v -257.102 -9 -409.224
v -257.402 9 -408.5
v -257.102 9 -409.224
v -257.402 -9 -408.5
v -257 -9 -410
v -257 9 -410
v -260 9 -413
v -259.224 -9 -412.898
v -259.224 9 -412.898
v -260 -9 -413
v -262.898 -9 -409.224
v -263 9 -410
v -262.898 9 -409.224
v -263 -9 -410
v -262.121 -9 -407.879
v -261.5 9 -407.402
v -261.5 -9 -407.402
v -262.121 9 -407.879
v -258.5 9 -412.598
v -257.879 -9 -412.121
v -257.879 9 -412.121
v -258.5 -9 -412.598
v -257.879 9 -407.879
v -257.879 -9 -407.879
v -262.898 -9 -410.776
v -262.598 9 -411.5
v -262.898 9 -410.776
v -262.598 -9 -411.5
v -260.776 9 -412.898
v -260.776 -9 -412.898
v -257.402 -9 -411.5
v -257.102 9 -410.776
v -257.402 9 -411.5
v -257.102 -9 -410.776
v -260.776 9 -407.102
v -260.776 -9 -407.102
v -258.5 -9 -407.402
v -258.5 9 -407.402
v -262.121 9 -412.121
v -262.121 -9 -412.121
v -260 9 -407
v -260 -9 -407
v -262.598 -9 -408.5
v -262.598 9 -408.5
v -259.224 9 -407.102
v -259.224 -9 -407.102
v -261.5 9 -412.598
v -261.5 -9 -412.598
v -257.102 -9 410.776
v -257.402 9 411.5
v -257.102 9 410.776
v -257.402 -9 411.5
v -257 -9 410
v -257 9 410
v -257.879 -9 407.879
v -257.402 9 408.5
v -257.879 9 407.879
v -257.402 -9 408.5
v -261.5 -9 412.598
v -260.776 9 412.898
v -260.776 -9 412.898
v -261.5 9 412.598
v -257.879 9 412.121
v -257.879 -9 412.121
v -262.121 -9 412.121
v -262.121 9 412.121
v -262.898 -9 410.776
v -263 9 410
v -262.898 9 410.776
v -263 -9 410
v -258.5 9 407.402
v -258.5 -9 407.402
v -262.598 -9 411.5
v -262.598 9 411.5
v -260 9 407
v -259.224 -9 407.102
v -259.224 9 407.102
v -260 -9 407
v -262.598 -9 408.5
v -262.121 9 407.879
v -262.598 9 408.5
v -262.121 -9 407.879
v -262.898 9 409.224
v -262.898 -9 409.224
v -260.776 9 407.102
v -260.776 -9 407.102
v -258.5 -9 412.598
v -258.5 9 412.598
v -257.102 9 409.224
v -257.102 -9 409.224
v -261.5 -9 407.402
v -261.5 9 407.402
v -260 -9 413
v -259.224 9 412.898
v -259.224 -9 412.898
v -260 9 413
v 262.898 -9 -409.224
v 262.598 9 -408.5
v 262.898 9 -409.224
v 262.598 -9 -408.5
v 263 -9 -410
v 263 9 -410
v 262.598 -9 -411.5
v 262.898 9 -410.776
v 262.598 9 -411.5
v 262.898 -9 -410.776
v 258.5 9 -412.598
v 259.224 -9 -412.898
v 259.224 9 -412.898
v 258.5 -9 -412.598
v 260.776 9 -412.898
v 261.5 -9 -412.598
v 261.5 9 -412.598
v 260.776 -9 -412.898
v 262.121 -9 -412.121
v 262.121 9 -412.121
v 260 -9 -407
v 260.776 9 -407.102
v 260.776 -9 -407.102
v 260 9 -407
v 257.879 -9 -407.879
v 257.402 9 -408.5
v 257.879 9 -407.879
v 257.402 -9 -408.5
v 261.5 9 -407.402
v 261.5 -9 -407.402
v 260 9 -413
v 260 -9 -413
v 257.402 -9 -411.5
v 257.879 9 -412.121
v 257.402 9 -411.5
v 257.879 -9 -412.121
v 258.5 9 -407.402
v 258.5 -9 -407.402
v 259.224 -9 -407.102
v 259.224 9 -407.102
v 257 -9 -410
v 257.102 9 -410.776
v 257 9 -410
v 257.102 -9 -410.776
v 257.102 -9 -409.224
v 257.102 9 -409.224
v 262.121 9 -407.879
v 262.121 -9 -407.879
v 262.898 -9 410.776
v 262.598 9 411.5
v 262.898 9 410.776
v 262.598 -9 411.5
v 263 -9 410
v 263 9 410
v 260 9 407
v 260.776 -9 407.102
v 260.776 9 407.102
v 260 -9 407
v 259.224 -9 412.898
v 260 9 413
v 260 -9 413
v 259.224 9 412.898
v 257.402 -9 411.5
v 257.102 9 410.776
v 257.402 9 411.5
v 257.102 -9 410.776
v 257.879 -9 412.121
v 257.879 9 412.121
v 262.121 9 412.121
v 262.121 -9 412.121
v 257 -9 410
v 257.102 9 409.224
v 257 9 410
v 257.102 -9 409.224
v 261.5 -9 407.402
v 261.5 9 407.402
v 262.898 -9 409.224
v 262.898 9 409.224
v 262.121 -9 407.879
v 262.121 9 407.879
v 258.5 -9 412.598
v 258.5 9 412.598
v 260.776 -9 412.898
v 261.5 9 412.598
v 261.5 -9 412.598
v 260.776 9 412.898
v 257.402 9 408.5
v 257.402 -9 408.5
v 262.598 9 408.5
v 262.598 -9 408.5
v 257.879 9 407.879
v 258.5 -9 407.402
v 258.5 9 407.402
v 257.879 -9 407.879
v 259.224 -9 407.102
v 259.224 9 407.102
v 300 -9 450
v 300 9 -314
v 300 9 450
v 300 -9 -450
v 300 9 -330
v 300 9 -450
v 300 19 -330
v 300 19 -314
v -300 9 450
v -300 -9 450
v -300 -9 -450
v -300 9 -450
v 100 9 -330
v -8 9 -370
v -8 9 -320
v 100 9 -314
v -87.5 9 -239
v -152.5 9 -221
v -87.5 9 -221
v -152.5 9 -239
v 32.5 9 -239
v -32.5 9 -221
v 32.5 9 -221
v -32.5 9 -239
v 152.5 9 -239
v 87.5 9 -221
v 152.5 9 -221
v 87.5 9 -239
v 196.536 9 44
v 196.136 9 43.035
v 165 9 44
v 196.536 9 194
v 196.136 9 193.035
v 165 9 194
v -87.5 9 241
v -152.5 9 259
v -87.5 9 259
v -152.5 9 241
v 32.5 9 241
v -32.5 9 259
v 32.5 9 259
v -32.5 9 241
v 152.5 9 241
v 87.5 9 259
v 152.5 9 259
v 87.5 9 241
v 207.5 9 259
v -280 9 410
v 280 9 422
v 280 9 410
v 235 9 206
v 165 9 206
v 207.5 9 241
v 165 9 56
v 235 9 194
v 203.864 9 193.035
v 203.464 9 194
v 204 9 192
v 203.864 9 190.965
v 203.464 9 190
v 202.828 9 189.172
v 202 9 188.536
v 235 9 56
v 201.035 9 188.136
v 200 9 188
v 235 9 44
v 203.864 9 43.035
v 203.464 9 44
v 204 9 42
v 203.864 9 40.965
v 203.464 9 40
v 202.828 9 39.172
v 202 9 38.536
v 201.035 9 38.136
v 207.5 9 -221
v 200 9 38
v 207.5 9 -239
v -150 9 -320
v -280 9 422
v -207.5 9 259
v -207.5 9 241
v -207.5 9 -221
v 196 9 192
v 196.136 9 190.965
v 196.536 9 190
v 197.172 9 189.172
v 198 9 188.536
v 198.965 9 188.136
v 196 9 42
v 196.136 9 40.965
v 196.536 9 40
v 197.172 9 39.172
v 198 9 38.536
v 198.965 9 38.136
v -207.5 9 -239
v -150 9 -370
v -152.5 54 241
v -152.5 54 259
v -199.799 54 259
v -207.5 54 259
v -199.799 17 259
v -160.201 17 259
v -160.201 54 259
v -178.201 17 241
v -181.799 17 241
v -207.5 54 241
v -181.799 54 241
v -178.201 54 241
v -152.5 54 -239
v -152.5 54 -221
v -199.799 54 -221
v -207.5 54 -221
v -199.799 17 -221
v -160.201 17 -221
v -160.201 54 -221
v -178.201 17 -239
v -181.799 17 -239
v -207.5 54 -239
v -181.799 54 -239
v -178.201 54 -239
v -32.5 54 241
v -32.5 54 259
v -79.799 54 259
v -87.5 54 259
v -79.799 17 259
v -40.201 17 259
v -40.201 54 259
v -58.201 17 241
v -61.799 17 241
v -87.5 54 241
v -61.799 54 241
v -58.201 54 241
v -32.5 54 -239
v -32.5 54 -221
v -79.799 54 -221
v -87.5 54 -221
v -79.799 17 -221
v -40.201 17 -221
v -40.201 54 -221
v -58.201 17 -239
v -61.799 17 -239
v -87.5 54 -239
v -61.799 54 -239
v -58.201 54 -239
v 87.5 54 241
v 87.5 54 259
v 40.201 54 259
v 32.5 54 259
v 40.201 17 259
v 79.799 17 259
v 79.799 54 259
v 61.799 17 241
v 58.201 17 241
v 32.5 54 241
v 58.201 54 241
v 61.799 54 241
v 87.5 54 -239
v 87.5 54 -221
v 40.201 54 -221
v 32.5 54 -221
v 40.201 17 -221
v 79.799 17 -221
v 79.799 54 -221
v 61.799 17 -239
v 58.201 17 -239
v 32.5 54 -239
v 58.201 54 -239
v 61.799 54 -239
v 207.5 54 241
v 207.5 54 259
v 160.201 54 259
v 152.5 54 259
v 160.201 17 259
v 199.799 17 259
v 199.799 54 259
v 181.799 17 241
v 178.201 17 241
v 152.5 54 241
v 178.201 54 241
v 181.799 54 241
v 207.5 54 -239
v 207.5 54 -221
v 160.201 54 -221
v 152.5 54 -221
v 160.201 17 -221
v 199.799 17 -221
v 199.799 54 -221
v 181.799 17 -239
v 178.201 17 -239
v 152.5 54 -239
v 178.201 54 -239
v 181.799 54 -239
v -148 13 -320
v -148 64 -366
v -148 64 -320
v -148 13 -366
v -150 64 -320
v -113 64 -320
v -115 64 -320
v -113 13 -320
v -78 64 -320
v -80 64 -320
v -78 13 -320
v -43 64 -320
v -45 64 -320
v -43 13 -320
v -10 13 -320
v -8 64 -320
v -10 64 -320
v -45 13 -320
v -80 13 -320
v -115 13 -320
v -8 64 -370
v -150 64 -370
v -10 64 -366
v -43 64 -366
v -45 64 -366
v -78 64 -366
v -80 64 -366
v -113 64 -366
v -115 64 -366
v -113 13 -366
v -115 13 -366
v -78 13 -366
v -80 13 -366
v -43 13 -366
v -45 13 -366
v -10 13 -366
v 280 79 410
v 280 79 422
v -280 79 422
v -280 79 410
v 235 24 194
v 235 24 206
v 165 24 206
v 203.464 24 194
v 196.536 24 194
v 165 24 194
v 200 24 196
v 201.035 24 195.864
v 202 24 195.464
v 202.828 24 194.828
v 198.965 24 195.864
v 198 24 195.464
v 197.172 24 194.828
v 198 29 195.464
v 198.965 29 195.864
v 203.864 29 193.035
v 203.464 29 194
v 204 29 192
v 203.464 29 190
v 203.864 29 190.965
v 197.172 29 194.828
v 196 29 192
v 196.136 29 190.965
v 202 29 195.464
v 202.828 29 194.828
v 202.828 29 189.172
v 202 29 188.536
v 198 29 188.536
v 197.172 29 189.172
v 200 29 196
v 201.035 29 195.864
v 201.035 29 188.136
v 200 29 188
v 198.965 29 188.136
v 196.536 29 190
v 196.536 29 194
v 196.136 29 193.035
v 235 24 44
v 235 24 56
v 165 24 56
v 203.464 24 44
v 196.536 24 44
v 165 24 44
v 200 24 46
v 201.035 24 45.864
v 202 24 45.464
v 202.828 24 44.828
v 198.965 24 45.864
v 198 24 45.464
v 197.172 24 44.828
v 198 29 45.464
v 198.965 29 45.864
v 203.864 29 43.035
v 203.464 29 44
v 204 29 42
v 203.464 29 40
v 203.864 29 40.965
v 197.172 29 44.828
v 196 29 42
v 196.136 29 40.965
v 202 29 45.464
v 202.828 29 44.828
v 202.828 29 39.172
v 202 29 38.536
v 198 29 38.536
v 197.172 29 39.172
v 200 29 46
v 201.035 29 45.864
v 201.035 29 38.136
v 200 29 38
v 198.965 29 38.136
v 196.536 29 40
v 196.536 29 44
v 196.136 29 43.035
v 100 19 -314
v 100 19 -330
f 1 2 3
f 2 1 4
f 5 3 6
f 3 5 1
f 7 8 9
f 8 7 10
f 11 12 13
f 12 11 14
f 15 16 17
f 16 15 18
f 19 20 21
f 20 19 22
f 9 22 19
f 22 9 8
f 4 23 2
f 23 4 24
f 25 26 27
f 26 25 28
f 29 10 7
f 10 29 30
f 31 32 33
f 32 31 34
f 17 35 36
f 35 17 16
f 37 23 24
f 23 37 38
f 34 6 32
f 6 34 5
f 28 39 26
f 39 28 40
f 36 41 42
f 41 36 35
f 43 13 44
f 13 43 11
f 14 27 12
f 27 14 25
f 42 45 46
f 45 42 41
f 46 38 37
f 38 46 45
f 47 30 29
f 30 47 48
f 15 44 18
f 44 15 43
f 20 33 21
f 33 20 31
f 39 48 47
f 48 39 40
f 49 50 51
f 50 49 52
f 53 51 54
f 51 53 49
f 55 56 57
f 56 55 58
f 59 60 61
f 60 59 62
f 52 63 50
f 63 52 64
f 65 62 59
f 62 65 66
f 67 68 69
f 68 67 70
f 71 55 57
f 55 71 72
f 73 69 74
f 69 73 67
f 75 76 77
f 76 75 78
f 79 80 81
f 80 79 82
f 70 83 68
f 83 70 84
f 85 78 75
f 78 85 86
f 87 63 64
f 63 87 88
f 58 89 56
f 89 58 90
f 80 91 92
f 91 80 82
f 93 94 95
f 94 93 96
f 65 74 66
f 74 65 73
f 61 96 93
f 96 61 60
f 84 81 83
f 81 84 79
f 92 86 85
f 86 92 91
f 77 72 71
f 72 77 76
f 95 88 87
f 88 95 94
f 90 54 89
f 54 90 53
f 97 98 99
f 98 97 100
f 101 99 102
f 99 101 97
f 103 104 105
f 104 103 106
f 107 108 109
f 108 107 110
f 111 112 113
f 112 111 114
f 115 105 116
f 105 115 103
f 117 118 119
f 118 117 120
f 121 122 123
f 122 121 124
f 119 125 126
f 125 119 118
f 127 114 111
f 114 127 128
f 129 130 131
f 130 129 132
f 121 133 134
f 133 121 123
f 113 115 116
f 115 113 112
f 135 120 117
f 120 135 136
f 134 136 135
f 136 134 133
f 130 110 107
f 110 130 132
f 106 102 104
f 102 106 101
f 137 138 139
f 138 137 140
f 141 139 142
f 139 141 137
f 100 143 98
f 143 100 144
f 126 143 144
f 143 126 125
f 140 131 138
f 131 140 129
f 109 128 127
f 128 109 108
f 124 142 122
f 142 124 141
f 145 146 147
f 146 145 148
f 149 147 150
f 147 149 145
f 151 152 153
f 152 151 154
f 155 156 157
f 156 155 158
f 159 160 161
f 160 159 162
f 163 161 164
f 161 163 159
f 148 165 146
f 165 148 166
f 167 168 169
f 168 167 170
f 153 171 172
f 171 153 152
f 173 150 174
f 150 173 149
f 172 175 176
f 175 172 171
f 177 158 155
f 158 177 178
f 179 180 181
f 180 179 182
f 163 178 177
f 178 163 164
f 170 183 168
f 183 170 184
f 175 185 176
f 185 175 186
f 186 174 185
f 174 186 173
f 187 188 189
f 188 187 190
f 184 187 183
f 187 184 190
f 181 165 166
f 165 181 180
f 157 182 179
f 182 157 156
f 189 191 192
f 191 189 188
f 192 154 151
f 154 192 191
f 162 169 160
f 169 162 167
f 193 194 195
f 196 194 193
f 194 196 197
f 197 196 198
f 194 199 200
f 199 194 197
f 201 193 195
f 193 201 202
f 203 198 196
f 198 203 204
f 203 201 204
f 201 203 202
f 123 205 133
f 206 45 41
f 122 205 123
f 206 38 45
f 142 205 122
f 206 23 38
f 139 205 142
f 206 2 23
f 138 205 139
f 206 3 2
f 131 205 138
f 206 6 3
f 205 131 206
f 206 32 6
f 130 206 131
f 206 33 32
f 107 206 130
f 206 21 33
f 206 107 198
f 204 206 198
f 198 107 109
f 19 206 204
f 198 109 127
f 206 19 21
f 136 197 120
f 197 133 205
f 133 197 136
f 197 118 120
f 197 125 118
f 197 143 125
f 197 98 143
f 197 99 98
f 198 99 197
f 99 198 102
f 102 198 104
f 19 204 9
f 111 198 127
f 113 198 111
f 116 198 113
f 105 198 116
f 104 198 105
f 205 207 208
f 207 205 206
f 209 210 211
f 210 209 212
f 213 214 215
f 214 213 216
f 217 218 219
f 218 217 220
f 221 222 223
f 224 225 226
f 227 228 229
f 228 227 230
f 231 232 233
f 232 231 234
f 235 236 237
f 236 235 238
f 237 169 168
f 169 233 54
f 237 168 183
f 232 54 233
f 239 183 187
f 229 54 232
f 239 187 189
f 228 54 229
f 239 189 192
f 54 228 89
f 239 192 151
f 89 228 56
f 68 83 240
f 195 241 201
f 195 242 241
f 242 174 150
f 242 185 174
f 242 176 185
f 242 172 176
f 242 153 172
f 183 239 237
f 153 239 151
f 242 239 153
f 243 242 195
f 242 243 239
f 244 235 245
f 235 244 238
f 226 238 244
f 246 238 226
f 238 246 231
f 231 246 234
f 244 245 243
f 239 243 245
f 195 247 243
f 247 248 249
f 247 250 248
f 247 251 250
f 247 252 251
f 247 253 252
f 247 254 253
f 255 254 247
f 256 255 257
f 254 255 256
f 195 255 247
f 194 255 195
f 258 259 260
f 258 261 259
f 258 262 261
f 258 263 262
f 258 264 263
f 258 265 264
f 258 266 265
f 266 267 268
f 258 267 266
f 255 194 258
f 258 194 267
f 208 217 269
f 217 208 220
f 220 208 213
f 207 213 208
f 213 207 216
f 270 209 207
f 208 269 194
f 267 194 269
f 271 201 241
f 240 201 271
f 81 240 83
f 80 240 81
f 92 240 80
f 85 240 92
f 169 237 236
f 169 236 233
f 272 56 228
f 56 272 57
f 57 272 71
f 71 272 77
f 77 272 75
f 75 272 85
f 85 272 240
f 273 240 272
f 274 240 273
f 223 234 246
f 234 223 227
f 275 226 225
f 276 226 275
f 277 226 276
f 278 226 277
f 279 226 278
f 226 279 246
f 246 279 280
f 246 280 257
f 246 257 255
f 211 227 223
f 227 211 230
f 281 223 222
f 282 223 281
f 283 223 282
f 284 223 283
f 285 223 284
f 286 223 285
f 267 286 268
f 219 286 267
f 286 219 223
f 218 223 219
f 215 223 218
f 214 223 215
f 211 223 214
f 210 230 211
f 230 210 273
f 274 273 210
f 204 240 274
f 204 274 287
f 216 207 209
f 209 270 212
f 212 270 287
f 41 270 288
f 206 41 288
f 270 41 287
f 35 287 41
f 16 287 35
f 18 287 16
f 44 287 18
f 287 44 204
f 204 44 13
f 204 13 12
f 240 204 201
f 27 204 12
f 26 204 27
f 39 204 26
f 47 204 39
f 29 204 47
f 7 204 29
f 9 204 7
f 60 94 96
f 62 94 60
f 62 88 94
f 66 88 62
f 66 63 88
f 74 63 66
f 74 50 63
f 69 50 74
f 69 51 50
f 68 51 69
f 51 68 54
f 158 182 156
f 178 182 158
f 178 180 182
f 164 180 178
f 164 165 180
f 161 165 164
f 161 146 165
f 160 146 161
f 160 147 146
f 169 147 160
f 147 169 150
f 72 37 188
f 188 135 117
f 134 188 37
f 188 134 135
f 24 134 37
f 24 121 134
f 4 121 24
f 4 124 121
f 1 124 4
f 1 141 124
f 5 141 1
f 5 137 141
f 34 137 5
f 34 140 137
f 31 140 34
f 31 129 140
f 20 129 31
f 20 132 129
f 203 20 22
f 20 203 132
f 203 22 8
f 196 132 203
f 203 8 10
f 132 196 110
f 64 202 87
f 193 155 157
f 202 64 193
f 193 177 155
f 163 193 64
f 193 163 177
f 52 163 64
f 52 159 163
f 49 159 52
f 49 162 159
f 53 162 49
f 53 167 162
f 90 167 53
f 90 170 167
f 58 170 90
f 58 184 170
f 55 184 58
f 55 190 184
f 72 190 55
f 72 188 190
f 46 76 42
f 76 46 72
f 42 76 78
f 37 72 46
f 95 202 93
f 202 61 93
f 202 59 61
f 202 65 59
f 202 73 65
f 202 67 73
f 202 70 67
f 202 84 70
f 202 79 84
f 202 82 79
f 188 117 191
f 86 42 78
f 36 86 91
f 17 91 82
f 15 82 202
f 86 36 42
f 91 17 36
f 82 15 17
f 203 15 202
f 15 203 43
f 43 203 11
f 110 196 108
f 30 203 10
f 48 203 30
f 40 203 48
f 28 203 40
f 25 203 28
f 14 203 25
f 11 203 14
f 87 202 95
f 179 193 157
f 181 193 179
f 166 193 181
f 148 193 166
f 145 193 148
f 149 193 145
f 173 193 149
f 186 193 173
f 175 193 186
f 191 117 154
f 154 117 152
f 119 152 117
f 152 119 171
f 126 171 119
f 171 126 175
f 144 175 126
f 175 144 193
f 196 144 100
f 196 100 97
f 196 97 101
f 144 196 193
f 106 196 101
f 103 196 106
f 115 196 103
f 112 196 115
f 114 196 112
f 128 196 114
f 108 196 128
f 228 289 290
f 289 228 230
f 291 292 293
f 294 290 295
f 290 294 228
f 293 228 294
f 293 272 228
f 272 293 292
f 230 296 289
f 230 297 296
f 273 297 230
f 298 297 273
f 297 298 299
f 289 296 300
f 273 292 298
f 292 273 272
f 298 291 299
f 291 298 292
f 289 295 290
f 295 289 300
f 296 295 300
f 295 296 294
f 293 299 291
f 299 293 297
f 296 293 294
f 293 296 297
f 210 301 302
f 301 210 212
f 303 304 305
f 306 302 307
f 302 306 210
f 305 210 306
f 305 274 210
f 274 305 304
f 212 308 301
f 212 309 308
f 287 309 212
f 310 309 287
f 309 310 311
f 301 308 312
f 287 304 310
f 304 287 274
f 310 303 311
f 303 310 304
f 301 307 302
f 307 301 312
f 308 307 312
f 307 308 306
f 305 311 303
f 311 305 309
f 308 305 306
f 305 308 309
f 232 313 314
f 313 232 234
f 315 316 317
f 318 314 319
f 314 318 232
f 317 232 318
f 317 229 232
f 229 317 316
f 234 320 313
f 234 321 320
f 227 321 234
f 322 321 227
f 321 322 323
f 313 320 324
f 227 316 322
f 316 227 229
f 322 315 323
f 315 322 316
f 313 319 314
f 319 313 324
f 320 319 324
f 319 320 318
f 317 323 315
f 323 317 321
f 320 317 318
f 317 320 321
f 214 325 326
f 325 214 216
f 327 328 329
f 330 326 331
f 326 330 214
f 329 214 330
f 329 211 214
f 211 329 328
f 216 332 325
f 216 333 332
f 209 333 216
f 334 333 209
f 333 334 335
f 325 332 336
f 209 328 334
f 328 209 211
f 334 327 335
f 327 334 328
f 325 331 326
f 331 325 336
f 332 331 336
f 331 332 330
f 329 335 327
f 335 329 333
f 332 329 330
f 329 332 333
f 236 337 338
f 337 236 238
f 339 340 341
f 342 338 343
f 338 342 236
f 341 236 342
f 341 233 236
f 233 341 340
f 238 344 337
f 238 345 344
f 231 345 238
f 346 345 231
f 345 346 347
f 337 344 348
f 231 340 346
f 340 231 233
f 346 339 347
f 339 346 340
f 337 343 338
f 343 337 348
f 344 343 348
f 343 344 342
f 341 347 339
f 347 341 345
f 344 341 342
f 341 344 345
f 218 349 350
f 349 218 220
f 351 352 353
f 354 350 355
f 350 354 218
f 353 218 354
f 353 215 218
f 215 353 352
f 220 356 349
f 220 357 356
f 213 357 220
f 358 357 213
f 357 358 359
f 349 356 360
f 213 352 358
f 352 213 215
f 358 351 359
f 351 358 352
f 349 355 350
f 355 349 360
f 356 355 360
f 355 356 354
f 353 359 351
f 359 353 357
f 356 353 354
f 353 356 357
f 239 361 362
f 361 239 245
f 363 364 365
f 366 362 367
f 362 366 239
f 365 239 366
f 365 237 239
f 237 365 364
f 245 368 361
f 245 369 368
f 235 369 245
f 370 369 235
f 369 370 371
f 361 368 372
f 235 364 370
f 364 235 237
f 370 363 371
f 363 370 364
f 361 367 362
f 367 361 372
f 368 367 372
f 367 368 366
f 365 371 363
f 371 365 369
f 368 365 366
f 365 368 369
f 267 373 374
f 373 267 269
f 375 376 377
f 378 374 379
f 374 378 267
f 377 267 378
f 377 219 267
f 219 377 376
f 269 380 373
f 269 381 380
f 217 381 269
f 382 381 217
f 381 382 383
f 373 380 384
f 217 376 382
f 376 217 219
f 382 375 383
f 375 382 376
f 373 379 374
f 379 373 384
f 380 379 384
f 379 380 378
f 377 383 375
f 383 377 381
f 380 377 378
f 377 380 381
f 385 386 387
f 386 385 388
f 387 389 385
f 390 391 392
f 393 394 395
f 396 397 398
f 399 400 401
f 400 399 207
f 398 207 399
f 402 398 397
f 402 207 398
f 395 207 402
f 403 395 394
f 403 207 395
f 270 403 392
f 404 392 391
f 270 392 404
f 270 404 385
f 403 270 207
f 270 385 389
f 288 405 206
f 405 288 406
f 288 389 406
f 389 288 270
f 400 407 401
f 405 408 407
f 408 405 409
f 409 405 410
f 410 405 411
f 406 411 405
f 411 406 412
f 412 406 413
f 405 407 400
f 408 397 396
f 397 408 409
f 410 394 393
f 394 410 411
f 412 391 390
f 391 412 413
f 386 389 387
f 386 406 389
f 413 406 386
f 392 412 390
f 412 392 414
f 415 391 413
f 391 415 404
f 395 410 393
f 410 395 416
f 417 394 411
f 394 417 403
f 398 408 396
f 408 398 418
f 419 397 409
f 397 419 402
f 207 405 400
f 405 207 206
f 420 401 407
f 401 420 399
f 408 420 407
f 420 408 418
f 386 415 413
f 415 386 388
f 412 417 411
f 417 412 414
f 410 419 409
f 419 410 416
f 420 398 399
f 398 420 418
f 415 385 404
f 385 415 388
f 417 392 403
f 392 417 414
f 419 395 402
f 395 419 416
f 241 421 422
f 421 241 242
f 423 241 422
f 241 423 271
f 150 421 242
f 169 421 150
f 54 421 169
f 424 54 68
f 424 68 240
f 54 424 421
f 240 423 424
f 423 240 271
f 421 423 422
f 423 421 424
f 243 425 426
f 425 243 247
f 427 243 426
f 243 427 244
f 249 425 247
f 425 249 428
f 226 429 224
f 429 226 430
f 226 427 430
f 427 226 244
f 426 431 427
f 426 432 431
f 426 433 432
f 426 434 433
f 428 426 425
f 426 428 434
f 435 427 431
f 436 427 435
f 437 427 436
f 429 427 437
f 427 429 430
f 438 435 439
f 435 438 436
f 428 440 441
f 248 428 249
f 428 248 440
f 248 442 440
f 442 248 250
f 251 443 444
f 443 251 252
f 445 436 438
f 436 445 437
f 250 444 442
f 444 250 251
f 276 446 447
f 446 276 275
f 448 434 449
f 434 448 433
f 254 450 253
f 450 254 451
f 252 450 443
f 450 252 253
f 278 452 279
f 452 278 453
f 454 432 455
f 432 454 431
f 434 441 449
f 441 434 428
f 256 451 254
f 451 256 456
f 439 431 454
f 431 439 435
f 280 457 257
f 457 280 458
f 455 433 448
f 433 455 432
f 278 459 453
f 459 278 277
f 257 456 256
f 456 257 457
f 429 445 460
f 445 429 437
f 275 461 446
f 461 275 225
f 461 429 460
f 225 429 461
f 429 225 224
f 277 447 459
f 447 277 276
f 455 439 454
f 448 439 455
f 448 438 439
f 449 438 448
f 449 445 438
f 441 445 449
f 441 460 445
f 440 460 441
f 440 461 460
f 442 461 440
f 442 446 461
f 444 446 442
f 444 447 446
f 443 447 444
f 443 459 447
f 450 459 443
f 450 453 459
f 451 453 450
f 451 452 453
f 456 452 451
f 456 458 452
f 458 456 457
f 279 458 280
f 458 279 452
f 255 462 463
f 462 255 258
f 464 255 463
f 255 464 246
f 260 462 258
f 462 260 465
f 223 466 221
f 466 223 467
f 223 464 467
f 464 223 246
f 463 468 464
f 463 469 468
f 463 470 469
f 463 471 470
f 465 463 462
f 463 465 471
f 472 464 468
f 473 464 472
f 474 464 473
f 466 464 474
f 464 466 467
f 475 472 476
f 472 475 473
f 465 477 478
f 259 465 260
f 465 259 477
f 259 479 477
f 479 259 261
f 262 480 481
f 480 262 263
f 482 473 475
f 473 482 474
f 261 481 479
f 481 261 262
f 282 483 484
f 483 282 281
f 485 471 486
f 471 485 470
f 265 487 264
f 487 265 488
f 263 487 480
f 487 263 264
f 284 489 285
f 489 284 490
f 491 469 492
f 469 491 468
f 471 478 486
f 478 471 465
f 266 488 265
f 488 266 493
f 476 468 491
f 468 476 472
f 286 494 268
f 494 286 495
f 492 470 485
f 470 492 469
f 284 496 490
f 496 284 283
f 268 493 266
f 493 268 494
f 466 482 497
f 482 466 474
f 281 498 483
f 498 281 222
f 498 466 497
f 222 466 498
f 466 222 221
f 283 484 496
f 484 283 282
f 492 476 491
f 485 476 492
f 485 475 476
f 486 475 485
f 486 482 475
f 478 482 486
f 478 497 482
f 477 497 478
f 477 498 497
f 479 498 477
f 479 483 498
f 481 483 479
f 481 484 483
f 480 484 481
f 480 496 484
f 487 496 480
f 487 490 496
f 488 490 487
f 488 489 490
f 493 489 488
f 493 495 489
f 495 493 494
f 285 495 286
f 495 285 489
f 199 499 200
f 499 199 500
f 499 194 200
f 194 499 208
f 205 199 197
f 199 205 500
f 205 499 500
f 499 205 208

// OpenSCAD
// RAF Silah Organizörü — parametrik OpenSCAD modeli
// Duvara monte: 4 tüfek yuvası, şarjör rafı, tabanca askı plakaları
// Birimler: mm

/* [Genel] */
board_w = 600;
board_h = 900;
board_t = 18;
edge = 12;

/* [Tüfek yuvaları] */
cradle_count = 4;
cradle_span = 360;
upper_y = 700;
lower_y = 220;
cradle_w = 55;
cradle_d = 45;
cradle_h = 18;

/* [Şarjör rafı] */
mag_slots = 4;
mag_w = 140;
mag_d = 55;
mag_h = 50;

module backboard() {
  difference() {
    cube([board_w, board_t, board_h], center = true);
    // Montaj delikleri
    for (x = [-board_w/2 + 40, board_w/2 - 40])
      for (z = [-board_h/2 + 40, board_h/2 - 40])
        translate([x, 0, z])
          rotate([90, 0, 0])
            cylinder(h = board_t + 2, r = 3, center = true, $fn = 24);
  }
}

module cradle(x, z) {
  translate([x, board_t/2 + cradle_d/2, z]) {
    difference() {
      cube([cradle_w, cradle_d, cradle_h], center = true);
      // V-kanal
      translate([0, 8, cradle_h/2])
        rotate([0, 45, 0])
          cube([28, cradle_d, 28], center = true);
    }
  }
}

module magazine_rack() {
  x0 = -board_w/4;
  z0 = -board_h/2 + 80;
  translate([x0, board_t/2, z0]) {
    cube([mag_w, mag_d, 4], center = false);
    translate([0, 0, 0])
      cube([mag_w, 4, mag_h], center = false);
    slot = mag_w / mag_slots;
    for (i = [0:mag_slots])
      translate([i * slot, 0, 0])
        cube([2, mag_d, mag_h], center = false);
  }
}

module pistol_plate(x, z) {
  translate([x, board_t/2, z]) {
    cube([70, 30, 12], center = true);
    translate([0, 20, -8])
      rotate([90, 0, 0])
        cylinder(h = 25, r = 4, $fn = 24);
  }
}

module peg_strip() {
  translate([board_w/6, board_t/2, -board_h/2 + 120]) {
    cube([200, 10, 16], center = false);
    for (i = [0:4])
      translate([20 + i * 40, 10, 8])
        rotate([90, 0, 0])
          cylinder(h = 20, r = 3, $fn = 16);
  }
}

module shelf() {
  translate([-board_w/2 + 20, board_t/2, board_h/2 - 40])
    cube([board_w - 40, 70, 12], center = false);
}

module organizer() {
  color("#8B5A2B") backboard();
  color("#5C3A1A") {
    for (i = [0:cradle_count - 1]) {
      x = -cradle_span/2 + i * (cradle_span / (cradle_count - 1));
      cradle(x, upper_y - board_h/2);
      cradle(x, lower_y - board_h/2);
    }
    magazine_rack();
    shelf();
  }
  color("#3A3A38") {
    pistol_plate(board_w/3, 200);
    pistol_plate(board_w/3, 50);
    peg_strip();
  }
}

organizer();
